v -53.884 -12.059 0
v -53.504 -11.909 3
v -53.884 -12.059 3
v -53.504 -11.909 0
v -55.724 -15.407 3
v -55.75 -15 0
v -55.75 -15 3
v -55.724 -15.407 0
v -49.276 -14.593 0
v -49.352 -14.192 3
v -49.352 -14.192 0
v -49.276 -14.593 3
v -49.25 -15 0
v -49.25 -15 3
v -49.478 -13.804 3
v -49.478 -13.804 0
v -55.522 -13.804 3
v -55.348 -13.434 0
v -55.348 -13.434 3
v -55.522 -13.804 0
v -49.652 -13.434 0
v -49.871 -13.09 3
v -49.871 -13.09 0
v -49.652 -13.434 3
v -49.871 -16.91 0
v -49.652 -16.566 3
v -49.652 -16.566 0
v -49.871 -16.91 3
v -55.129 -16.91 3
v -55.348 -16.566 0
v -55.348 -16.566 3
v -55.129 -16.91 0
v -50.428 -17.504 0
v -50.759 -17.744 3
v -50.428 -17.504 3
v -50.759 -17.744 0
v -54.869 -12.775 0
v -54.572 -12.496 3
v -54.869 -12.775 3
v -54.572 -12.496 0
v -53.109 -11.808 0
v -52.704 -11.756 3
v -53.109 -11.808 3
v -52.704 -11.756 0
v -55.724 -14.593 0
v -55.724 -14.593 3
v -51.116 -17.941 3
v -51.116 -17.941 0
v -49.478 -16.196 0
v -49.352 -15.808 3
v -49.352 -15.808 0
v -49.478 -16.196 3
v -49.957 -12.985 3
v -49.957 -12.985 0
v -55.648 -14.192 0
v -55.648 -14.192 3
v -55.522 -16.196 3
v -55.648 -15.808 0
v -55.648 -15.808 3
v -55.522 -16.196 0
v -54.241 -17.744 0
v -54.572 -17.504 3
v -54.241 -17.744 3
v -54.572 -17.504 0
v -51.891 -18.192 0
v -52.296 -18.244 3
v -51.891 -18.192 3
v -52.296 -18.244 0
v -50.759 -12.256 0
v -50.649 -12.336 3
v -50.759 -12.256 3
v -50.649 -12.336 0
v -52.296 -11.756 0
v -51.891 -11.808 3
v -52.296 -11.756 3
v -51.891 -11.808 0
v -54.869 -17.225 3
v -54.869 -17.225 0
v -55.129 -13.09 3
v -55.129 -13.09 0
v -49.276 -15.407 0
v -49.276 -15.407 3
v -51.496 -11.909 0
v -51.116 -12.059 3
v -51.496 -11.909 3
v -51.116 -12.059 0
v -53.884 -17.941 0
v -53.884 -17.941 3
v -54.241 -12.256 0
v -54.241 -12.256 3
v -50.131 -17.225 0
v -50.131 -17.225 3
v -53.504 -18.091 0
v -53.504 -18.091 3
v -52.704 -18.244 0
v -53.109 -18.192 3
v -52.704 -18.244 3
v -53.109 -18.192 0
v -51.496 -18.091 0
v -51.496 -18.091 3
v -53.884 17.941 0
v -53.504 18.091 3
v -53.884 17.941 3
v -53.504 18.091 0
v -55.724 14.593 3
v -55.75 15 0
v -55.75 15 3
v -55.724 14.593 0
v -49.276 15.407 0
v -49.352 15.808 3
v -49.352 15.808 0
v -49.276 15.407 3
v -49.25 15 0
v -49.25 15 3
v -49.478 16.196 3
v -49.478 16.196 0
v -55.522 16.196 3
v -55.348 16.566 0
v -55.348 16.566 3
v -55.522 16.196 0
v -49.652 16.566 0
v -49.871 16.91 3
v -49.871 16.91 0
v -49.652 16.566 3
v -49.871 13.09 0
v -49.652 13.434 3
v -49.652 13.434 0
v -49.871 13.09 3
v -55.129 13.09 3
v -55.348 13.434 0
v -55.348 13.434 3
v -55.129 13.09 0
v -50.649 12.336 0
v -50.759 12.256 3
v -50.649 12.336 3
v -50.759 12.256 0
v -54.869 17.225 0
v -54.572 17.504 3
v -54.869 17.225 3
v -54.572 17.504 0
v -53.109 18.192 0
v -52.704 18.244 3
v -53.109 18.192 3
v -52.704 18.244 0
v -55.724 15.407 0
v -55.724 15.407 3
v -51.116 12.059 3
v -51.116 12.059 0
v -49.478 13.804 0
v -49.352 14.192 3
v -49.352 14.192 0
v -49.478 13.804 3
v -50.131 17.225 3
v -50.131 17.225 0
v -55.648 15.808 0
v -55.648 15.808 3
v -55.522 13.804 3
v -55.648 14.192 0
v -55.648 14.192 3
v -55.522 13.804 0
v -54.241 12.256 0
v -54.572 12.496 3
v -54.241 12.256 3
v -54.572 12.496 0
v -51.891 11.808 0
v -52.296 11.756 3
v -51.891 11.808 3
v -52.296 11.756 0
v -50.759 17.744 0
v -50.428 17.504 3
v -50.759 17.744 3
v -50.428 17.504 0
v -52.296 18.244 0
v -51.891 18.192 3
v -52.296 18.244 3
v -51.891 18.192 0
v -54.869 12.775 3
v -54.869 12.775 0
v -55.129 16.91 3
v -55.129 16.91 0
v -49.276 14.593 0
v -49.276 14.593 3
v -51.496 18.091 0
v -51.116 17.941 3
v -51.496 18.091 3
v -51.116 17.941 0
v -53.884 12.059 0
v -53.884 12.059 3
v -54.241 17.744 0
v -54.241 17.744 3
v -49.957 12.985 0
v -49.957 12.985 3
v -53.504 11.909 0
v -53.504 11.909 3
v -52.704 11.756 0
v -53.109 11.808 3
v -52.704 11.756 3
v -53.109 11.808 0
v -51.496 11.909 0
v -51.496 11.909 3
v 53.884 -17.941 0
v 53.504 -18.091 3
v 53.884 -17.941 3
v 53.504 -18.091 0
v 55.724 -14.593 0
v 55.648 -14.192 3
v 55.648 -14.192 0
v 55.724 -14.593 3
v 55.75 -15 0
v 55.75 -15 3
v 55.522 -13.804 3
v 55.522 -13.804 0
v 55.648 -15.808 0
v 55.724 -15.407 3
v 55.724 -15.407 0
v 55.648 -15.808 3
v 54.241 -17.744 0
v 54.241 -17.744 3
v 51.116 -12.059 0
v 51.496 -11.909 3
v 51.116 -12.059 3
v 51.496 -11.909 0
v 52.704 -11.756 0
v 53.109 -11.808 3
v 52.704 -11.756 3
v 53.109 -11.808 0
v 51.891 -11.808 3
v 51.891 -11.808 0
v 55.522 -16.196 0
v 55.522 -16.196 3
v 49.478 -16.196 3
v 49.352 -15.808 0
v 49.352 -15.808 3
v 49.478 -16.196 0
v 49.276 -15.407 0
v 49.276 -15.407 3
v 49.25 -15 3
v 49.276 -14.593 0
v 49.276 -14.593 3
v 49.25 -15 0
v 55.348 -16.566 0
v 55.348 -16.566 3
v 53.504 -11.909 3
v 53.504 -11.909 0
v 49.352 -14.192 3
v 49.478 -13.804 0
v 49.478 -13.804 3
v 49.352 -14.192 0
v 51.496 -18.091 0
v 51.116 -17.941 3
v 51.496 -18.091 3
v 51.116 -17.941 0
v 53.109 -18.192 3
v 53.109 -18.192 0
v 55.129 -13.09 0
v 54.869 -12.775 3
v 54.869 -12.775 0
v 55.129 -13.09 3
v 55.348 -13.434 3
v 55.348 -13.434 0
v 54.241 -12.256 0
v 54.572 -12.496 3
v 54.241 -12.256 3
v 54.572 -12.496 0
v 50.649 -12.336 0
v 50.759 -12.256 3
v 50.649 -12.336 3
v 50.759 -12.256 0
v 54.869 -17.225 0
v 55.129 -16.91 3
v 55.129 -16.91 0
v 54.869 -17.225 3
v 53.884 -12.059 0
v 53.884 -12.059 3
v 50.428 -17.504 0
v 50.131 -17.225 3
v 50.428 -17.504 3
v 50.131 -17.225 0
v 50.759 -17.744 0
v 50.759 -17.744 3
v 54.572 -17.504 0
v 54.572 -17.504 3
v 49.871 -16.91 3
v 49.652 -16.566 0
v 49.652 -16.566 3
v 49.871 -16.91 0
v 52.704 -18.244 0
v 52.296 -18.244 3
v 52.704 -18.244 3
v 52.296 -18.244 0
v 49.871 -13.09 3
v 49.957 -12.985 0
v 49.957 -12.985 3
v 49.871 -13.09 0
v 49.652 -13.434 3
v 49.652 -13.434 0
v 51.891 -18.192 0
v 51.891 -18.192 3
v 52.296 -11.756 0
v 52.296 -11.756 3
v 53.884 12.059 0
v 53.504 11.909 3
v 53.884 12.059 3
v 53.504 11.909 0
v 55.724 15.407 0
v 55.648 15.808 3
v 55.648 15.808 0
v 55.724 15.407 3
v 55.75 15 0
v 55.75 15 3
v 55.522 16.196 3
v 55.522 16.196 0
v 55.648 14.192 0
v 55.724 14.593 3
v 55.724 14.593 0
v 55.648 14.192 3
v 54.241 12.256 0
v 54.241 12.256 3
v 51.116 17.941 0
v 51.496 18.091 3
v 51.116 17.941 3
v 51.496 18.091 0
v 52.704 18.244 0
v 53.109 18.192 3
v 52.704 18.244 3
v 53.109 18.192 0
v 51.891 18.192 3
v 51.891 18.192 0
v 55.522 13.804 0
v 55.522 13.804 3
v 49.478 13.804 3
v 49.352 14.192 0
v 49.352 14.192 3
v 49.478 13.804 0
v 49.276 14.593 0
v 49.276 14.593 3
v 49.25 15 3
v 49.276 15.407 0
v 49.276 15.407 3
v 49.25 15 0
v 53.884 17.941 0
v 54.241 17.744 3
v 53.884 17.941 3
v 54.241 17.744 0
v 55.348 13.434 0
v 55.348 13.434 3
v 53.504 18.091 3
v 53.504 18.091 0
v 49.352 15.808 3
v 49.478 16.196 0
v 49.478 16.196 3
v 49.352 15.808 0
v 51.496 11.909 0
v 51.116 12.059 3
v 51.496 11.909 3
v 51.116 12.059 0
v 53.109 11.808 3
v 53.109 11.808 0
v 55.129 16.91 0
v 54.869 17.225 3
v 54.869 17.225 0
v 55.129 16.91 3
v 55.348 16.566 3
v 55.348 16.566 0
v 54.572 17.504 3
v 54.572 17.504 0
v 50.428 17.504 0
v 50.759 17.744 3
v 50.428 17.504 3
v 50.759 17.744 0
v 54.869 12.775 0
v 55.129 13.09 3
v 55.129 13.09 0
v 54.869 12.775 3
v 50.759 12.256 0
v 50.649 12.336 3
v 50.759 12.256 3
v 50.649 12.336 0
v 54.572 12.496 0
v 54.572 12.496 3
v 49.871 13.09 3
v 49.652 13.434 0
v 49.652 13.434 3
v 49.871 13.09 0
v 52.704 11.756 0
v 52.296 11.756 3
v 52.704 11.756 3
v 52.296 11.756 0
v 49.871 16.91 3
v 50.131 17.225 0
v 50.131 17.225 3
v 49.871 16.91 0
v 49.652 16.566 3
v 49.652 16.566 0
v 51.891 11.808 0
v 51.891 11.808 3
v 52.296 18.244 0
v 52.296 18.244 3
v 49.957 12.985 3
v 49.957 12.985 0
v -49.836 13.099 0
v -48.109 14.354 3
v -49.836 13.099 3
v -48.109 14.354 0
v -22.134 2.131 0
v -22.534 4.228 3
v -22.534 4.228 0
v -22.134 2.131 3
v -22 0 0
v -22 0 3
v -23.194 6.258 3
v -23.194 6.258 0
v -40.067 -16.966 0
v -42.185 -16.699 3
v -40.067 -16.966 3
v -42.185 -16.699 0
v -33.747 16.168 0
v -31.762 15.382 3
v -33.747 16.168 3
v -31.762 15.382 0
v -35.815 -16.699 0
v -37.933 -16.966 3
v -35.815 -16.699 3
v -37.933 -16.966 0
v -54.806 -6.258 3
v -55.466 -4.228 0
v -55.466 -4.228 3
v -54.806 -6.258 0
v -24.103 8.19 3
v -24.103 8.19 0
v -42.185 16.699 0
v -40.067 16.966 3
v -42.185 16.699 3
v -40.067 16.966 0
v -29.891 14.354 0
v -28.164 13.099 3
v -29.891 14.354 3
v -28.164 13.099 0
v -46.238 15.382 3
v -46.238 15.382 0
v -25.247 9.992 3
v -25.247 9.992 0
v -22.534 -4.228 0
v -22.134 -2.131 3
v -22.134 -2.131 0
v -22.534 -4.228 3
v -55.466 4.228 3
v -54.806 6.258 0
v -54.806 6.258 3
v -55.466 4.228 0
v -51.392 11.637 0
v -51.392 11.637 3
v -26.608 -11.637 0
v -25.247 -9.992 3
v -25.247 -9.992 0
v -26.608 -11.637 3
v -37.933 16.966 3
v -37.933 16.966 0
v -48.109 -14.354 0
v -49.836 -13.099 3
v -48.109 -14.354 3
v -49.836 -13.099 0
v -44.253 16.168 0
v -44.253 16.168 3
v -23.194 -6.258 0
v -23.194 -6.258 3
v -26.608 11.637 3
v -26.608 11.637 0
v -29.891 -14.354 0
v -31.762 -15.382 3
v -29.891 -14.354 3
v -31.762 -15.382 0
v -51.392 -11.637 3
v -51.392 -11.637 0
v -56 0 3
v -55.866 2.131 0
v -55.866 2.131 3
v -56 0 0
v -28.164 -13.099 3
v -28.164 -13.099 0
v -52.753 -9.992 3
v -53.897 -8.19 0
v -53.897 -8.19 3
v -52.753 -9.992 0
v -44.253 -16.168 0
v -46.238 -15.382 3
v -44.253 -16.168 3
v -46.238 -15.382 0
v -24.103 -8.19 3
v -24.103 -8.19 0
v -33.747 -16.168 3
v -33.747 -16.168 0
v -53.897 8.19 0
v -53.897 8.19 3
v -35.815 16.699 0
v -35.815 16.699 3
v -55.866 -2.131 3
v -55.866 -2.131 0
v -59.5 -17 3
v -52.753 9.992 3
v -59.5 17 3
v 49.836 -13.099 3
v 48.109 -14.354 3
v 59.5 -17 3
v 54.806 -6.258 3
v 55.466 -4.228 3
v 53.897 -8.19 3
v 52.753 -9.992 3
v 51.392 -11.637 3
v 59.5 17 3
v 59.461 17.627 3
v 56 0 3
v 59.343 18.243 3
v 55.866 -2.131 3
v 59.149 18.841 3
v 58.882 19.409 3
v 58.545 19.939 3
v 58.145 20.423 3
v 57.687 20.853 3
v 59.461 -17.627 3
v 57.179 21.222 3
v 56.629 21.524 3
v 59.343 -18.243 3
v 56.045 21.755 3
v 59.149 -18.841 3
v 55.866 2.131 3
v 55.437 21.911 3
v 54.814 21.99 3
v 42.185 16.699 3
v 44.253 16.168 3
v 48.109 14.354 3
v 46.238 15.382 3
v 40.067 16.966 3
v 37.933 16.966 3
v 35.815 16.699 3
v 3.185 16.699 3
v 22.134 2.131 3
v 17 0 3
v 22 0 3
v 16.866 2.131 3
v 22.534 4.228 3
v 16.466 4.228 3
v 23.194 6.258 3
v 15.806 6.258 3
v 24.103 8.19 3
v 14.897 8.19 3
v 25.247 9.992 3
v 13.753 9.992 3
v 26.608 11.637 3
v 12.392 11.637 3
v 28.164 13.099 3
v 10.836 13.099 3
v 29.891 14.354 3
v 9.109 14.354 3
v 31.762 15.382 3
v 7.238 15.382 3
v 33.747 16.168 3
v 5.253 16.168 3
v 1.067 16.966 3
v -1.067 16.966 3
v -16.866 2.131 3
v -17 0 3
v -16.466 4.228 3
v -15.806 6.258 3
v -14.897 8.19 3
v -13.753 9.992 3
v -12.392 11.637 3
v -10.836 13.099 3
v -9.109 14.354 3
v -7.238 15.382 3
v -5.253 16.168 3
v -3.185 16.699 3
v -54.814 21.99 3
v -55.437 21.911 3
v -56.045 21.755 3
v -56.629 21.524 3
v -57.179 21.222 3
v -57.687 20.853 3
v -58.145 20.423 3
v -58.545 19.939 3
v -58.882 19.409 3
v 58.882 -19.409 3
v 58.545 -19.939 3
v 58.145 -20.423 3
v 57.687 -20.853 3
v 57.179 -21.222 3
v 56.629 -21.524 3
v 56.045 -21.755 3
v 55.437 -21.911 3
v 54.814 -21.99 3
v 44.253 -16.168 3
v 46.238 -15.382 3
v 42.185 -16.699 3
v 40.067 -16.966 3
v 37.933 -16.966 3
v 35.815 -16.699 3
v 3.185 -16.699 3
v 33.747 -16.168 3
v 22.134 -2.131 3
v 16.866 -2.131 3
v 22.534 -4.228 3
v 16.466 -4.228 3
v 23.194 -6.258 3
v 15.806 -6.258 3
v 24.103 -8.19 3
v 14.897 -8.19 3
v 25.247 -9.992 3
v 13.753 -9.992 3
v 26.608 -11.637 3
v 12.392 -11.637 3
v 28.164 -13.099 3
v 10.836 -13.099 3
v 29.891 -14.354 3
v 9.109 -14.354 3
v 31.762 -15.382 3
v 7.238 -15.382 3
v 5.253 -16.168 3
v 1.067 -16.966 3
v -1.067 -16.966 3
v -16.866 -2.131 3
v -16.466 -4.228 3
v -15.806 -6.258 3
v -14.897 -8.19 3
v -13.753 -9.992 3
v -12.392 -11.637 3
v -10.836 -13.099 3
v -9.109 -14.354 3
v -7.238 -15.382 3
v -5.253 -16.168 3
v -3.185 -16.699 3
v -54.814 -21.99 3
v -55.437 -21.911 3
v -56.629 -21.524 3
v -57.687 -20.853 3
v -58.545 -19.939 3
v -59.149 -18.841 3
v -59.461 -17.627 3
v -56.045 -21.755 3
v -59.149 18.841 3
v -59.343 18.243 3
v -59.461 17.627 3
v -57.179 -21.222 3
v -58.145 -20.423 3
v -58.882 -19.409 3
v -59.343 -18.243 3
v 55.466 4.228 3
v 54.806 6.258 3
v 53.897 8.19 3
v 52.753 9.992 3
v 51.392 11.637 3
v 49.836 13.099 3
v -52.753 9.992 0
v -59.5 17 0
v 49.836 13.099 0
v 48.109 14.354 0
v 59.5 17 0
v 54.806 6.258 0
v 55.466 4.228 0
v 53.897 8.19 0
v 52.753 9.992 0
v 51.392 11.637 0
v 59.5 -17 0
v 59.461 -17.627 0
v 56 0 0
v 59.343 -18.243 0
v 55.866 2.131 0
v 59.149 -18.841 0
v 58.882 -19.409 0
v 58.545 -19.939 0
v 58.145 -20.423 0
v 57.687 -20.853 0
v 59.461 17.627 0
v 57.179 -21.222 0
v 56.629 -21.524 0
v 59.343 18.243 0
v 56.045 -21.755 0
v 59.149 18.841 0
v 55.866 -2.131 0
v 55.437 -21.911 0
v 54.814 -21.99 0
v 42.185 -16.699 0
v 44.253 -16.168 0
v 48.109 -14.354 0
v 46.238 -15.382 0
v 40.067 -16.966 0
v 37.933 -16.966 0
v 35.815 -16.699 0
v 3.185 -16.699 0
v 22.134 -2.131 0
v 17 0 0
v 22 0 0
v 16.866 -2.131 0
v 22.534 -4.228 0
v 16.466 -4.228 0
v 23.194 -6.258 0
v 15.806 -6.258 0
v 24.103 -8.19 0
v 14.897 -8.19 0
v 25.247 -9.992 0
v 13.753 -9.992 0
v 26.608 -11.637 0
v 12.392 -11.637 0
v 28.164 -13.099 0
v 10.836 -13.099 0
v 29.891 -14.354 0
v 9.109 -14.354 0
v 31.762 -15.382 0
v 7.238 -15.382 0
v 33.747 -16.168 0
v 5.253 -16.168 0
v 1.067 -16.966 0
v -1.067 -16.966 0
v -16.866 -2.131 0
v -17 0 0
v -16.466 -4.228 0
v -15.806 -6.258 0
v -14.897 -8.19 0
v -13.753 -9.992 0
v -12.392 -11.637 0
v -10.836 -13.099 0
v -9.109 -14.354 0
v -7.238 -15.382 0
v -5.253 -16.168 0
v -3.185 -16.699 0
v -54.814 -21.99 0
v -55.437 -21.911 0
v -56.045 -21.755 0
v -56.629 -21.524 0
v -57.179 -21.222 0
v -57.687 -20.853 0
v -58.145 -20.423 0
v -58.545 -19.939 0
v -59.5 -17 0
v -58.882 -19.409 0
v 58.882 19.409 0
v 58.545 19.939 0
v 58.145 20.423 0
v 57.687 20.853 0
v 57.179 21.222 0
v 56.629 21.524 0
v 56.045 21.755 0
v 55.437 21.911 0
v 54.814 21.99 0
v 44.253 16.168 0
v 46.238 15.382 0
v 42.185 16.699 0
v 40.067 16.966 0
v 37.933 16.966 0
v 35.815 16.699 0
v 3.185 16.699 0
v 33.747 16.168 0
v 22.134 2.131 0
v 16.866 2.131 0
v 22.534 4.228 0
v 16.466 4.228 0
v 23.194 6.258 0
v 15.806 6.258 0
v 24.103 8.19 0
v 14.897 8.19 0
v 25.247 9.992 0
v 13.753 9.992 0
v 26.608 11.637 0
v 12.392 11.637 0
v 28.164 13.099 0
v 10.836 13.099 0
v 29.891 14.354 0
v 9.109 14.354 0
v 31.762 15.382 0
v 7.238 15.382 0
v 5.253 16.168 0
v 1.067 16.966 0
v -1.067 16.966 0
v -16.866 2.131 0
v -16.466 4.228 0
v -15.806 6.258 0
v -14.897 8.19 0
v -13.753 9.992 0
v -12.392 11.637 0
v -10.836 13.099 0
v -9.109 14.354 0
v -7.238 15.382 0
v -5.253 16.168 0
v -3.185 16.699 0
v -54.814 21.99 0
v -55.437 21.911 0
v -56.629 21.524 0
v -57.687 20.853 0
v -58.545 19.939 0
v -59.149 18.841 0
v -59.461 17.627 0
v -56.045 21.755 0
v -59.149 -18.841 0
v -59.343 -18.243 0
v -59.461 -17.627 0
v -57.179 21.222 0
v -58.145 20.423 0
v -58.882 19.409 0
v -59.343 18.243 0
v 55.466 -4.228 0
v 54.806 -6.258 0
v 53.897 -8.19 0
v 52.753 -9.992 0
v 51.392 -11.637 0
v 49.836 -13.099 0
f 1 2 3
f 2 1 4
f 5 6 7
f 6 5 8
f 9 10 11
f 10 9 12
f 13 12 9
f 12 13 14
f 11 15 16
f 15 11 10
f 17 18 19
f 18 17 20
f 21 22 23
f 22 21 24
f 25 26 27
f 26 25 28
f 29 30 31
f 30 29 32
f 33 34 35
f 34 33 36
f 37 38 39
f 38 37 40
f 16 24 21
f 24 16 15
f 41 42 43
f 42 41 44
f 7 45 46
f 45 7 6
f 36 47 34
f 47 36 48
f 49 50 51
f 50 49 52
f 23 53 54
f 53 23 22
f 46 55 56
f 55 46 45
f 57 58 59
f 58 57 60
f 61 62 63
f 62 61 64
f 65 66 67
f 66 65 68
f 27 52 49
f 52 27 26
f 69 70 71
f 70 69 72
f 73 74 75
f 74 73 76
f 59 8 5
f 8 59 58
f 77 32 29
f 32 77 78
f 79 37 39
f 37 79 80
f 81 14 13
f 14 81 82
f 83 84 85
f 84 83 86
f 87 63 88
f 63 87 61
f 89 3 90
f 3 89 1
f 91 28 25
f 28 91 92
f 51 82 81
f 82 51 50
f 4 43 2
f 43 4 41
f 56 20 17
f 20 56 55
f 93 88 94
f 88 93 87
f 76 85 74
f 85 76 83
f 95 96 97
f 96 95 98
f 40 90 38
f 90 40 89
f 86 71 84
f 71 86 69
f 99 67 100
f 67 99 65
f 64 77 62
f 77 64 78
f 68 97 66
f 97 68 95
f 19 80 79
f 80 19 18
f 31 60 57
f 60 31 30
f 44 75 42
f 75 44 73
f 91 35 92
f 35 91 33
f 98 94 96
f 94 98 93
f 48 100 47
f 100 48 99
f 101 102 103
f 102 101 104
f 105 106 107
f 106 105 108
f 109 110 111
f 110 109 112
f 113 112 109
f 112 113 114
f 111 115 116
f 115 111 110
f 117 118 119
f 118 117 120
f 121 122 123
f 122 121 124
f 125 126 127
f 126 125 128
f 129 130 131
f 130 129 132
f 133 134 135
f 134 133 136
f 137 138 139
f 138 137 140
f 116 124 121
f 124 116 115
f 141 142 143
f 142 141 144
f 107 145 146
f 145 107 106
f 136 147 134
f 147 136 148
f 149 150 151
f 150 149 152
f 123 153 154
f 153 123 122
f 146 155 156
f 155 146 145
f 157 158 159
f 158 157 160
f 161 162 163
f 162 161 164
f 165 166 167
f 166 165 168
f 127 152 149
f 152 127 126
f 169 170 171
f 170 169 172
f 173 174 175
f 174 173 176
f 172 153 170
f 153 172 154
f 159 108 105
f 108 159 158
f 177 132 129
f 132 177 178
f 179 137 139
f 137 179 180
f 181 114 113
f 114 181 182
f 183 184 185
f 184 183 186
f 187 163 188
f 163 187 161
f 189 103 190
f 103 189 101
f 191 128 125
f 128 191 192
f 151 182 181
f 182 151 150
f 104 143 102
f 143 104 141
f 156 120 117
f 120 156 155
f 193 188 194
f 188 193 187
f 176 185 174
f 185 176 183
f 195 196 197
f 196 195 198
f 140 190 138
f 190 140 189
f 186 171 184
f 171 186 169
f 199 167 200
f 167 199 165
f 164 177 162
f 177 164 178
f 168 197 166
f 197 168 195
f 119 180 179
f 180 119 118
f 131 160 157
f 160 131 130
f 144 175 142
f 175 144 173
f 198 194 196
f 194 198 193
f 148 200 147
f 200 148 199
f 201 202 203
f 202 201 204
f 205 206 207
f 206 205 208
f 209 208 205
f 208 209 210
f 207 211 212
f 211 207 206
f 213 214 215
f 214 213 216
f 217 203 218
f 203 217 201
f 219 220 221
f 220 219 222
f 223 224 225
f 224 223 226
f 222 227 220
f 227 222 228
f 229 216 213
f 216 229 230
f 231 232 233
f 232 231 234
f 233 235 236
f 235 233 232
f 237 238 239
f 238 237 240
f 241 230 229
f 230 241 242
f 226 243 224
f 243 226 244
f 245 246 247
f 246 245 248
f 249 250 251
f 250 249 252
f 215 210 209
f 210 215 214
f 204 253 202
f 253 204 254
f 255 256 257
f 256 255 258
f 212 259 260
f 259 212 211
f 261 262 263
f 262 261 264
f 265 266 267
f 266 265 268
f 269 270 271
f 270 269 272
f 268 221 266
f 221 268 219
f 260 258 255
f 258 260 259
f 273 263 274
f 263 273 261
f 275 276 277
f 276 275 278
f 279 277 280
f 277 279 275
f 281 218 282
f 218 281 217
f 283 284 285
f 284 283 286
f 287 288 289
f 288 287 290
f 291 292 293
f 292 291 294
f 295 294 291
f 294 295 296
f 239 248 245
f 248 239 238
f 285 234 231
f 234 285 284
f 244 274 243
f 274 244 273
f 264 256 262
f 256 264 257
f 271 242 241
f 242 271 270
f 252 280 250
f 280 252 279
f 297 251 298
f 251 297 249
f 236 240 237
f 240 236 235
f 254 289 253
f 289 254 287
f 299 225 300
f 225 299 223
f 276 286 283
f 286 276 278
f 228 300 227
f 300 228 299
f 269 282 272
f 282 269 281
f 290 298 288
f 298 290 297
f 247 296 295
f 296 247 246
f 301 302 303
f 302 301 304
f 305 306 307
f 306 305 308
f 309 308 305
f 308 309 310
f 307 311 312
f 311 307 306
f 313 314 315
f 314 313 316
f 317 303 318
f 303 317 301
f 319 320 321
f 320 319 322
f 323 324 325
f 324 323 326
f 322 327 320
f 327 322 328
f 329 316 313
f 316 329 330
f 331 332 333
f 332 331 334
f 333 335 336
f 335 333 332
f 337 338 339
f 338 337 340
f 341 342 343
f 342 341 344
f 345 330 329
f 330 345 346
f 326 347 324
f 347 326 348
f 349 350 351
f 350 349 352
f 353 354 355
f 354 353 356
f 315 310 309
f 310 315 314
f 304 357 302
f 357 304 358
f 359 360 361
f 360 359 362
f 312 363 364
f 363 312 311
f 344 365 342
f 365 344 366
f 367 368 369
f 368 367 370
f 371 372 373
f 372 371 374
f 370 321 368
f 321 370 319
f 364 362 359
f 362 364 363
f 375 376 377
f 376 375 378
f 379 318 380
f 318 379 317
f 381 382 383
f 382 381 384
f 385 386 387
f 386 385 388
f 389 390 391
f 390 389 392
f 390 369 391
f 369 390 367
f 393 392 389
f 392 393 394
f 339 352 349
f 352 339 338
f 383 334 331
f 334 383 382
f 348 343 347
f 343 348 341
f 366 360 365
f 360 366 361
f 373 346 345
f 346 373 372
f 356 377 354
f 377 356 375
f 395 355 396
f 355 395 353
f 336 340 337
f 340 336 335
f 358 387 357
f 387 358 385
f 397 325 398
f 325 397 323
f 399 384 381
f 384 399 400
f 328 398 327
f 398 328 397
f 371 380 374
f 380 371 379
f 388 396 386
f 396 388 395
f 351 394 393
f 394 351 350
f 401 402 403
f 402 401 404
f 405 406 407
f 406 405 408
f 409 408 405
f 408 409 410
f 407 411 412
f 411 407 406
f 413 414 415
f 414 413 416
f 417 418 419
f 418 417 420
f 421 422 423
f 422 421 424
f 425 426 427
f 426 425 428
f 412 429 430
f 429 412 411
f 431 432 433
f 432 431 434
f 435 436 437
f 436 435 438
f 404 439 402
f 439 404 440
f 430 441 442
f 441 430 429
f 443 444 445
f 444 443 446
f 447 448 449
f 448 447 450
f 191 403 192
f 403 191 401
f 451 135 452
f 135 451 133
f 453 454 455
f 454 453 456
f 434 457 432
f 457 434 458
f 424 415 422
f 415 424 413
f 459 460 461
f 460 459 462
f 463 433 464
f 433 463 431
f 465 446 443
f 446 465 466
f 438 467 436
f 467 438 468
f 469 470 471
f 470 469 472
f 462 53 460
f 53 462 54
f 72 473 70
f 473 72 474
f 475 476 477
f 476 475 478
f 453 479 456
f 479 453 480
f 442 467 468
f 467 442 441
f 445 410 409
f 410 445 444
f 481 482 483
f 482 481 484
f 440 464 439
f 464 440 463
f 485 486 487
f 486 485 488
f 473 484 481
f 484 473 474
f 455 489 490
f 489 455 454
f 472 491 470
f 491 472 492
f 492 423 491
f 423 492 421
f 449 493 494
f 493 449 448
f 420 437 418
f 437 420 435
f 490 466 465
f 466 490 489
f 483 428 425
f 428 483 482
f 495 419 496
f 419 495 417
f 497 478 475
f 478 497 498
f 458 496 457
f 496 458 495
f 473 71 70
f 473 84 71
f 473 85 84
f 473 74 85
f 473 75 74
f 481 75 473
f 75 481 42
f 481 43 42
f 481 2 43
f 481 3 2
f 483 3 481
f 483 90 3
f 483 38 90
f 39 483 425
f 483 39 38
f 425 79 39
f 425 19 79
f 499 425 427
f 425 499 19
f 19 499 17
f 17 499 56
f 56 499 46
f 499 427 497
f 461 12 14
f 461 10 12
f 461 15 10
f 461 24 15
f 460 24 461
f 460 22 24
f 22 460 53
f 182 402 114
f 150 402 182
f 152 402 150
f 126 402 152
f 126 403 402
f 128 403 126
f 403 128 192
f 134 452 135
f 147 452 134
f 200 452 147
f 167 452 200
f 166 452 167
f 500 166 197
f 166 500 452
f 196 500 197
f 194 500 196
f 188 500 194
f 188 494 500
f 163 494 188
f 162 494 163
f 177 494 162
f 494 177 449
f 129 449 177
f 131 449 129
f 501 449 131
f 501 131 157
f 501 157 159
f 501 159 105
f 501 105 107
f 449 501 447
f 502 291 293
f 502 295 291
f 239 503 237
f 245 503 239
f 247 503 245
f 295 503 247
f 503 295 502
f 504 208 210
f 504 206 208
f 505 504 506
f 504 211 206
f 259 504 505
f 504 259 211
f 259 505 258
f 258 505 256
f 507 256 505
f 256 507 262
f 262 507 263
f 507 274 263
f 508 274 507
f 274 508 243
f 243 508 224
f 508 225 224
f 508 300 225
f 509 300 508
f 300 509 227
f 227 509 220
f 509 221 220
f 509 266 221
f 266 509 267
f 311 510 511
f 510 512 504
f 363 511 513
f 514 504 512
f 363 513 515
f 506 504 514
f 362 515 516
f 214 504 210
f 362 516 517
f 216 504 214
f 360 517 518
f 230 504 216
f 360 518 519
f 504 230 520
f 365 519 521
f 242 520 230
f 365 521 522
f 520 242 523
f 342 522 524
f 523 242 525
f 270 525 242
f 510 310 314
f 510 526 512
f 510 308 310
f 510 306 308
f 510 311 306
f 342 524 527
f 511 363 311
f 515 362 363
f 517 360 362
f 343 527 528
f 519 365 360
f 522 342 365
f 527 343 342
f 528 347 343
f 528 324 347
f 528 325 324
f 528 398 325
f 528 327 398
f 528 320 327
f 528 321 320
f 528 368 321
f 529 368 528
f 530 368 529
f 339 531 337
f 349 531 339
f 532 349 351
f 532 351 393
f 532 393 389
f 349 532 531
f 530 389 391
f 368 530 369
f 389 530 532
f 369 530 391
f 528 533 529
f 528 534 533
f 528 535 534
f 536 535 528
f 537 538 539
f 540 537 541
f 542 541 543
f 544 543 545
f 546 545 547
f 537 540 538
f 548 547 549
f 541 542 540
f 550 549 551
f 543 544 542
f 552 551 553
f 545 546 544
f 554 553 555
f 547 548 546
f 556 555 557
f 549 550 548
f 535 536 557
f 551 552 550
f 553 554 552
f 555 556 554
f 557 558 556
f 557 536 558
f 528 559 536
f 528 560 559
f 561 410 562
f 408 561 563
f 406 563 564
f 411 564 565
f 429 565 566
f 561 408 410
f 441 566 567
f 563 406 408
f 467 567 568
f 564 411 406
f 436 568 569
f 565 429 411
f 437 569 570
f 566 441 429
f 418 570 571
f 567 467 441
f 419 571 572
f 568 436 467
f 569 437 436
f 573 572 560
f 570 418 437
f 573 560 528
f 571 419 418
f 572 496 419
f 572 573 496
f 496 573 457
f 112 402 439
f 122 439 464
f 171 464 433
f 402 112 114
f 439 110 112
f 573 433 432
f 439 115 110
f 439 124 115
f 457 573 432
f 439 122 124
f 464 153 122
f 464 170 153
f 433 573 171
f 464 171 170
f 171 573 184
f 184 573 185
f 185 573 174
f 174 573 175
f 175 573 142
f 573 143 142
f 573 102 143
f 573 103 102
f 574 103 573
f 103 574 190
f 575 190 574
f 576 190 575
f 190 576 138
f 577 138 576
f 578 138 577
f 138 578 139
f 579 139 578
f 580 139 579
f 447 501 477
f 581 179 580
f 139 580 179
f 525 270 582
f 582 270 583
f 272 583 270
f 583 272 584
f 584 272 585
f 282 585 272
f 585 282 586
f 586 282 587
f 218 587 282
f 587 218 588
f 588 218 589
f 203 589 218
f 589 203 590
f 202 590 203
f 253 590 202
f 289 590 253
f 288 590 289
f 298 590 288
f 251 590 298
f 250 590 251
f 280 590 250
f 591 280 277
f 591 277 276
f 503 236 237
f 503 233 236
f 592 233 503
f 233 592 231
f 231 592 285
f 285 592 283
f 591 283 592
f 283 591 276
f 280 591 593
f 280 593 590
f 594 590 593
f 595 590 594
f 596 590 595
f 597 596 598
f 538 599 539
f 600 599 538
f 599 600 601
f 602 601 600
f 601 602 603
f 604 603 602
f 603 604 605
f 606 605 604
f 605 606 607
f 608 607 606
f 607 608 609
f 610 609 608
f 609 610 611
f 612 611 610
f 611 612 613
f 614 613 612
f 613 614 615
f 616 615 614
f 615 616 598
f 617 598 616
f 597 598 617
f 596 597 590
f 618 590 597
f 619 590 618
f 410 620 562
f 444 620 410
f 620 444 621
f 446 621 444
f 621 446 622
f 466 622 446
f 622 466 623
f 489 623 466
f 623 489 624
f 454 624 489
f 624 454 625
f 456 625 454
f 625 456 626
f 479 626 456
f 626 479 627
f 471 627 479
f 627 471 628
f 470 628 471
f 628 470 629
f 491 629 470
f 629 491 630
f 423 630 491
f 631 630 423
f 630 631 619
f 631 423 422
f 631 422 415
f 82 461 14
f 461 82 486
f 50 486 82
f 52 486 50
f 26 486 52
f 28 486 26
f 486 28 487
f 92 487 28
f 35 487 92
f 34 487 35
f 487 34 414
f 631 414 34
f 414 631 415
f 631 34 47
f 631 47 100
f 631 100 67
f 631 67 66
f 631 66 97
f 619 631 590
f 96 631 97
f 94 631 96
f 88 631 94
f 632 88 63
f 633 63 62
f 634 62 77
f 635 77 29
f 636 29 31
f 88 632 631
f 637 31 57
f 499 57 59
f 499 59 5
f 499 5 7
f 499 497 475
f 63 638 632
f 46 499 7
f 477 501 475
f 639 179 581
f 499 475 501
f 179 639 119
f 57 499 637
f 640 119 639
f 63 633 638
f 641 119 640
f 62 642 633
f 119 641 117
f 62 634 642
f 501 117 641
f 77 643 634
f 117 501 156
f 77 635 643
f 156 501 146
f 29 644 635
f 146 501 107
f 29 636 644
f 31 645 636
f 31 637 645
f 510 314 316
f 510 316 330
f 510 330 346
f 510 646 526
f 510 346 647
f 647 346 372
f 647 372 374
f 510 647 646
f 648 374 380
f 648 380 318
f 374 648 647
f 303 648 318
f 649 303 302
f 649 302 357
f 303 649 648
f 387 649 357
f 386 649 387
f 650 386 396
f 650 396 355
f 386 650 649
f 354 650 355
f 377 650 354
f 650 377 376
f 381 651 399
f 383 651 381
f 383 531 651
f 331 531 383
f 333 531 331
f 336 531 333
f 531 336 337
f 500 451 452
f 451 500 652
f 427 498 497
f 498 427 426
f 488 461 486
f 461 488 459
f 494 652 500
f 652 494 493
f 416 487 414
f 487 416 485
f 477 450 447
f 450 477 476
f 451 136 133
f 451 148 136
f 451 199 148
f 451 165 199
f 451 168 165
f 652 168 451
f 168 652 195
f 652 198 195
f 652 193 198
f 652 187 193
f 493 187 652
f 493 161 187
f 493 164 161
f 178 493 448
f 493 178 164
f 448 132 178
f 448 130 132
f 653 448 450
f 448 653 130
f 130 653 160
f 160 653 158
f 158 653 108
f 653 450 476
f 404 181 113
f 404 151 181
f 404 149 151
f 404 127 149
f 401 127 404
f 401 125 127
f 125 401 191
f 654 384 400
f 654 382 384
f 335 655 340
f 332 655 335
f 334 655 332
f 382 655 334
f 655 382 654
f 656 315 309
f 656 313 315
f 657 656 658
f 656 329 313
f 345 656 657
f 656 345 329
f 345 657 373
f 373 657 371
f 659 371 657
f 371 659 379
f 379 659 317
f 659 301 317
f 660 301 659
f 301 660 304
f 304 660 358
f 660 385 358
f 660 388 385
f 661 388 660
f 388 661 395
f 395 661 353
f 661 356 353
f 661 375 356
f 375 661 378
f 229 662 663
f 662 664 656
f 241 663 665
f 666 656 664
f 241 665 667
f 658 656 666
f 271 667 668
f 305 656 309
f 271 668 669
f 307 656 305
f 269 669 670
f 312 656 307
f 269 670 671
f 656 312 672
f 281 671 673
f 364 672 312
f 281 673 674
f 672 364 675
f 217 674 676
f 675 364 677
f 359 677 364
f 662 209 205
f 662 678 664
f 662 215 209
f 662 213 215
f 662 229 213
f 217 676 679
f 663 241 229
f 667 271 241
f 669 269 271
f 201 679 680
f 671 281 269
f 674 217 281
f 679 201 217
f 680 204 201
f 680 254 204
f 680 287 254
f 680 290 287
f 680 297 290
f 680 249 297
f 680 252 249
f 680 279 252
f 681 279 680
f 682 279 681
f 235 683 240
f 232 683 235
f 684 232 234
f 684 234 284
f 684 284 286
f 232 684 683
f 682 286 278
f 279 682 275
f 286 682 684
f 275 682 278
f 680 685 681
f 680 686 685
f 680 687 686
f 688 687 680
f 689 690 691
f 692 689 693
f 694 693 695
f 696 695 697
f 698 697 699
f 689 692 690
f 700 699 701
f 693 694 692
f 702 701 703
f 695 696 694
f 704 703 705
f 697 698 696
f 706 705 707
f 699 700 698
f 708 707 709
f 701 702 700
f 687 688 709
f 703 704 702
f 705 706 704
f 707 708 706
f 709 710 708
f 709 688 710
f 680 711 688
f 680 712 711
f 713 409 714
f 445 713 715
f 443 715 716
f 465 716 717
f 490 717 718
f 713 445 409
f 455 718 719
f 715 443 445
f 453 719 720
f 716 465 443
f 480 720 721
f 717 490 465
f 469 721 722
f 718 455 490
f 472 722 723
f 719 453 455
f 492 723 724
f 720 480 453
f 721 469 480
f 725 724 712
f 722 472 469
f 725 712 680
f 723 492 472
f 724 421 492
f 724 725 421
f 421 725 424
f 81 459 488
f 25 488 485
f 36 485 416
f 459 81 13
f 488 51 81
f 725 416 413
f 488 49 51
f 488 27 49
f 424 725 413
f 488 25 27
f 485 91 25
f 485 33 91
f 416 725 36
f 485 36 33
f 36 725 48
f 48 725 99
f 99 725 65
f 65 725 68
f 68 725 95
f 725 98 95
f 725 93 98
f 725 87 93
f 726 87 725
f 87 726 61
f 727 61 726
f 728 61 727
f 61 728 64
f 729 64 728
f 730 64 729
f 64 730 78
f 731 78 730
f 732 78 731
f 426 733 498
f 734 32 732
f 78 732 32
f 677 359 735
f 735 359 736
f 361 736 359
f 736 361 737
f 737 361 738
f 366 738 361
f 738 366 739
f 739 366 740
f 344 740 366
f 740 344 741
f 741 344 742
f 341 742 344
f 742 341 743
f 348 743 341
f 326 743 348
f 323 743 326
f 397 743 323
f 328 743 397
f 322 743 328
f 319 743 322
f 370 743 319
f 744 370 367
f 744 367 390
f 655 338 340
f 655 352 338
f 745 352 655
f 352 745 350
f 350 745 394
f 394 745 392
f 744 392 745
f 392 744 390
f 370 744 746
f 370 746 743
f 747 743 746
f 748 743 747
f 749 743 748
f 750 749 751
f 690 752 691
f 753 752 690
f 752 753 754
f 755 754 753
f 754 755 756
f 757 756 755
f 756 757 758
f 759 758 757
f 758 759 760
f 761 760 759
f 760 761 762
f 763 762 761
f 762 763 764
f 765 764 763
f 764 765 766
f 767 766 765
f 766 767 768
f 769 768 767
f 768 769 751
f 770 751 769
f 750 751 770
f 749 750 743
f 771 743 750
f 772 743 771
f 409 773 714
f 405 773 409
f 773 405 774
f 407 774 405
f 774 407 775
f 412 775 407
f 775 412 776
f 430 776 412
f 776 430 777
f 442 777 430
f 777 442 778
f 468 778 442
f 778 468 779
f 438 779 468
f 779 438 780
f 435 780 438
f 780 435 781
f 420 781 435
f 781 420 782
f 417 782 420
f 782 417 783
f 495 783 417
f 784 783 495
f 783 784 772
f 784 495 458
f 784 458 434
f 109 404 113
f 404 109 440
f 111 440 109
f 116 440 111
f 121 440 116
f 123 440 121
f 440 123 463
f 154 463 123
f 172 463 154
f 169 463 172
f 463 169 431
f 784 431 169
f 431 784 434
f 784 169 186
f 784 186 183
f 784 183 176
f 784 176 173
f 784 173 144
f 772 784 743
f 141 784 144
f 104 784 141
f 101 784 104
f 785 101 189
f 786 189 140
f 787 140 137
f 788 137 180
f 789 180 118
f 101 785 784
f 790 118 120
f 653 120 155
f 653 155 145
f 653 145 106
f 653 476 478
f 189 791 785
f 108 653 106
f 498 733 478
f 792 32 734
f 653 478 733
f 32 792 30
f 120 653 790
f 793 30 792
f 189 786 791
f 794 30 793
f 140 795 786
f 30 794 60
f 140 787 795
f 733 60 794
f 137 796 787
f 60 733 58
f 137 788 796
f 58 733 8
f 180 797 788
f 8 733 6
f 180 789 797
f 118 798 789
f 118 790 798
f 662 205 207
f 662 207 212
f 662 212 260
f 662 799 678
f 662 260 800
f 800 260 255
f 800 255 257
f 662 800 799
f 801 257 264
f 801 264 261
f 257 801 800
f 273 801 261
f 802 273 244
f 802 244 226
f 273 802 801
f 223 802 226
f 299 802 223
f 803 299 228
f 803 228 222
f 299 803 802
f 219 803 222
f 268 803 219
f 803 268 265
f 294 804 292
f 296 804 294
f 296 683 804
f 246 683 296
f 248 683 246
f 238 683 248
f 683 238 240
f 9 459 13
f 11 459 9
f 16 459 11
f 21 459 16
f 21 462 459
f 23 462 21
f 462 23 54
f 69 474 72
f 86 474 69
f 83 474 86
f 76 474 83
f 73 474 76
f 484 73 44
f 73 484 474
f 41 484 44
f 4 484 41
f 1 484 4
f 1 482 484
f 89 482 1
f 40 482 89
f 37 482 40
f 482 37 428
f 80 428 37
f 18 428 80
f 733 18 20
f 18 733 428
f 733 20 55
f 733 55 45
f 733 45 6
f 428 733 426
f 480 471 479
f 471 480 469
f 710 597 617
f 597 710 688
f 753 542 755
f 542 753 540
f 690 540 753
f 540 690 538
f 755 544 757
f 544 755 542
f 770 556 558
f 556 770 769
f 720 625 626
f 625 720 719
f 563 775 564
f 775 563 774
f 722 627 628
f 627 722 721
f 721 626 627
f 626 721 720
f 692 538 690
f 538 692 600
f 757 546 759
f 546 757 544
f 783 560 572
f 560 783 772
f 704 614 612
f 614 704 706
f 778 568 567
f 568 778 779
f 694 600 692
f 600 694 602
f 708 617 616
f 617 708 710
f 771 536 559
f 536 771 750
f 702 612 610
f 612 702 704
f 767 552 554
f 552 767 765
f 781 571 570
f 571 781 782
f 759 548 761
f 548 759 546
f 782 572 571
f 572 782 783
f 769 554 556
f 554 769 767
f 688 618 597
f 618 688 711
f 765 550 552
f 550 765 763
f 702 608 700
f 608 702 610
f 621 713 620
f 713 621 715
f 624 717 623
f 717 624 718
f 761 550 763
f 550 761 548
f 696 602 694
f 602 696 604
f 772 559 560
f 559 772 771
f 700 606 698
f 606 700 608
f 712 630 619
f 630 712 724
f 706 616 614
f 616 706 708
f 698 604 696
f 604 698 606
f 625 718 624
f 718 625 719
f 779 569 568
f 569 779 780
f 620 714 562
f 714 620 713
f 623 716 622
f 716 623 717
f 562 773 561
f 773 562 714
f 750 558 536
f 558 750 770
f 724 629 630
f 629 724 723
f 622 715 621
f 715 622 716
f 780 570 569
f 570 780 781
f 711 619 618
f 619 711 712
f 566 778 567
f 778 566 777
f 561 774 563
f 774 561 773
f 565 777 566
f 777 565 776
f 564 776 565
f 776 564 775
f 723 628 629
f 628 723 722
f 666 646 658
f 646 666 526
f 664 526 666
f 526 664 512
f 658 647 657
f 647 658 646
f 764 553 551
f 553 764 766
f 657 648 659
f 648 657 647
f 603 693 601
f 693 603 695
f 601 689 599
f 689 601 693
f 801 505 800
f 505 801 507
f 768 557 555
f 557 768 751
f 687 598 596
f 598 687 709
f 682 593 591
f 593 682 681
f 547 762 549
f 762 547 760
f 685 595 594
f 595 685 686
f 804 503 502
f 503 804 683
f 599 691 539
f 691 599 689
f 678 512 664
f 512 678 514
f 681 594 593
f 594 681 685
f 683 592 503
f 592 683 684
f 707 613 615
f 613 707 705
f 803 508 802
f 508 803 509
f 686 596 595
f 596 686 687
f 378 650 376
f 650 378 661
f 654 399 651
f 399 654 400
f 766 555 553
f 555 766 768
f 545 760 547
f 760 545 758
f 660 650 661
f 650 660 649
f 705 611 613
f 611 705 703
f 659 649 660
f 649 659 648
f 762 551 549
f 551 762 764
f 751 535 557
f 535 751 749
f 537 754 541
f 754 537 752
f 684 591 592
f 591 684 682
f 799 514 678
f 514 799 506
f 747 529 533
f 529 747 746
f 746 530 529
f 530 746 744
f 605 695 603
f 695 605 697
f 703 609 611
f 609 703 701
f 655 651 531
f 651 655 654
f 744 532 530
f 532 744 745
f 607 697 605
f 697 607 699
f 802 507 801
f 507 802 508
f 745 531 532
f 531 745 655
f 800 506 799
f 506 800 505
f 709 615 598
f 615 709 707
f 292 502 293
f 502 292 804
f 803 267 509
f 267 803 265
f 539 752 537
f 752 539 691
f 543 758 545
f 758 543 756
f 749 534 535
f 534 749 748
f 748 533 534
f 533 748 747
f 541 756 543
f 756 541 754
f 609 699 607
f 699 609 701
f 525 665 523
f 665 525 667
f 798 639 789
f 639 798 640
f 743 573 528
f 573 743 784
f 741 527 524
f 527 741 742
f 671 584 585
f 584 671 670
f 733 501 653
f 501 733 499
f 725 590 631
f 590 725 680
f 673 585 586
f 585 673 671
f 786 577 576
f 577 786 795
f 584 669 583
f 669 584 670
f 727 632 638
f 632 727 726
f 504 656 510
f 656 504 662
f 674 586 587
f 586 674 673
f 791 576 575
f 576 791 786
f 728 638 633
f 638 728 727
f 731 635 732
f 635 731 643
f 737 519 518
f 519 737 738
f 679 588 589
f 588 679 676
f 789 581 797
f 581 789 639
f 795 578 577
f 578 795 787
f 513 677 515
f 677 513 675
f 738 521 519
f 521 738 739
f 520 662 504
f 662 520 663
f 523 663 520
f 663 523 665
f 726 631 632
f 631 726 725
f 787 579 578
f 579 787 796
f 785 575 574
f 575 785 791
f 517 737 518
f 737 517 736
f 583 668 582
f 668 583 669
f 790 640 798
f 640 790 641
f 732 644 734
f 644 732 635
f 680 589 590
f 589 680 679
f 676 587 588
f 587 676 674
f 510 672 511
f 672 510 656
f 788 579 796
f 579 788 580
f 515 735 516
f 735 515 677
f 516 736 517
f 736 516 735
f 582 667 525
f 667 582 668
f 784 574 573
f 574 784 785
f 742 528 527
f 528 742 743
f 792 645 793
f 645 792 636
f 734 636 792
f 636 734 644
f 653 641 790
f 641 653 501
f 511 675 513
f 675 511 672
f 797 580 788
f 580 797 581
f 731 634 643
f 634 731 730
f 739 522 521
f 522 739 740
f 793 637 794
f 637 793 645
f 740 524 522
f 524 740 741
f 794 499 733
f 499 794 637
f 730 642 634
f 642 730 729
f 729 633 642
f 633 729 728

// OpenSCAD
$fn = 50;


difference() {
	union() {
		hull() {
			translate(v = [-54.5000000000, 17.0000000000, 0]) {
				cylinder(h = 3, r = 5);
			}
			translate(v = [54.5000000000, 17.0000000000, 0]) {
				cylinder(h = 3, r = 5);
			}
			translate(v = [-54.5000000000, -17.0000000000, 0]) {
				cylinder(h = 3, r = 5);
			}
			translate(v = [54.5000000000, -17.0000000000, 0]) {
				cylinder(h = 3, r = 5);
			}
		}
	}
	union() {
		#translate(v = [-52.5000000000, -15.0000000000, -100.0000000000]) {
			cylinder(h = 200, r = 3.2500000000);
		}
		#translate(v = [-52.5000000000, 15.0000000000, -100.0000000000]) {
			cylinder(h = 200, r = 3.2500000000);
		}
		#translate(v = [52.5000000000, -15.0000000000, -100.0000000000]) {
			cylinder(h = 200, r = 3.2500000000);
		}
		#translate(v = [52.5000000000, 15.0000000000, -100.0000000000]) {
			cylinder(h = 200, r = 3.2500000000);
		}
		#translate(v = [-39.0000000000, 0, 0]) {
			cylinder(h = 3, r = 17.0000000000);
		}
		#cylinder(h = 3, r = 17.0000000000);
		#translate(v = [39.0000000000, 0, 0]) {
			cylinder(h = 3, r = 17.0000000000);
		}
	}
}
